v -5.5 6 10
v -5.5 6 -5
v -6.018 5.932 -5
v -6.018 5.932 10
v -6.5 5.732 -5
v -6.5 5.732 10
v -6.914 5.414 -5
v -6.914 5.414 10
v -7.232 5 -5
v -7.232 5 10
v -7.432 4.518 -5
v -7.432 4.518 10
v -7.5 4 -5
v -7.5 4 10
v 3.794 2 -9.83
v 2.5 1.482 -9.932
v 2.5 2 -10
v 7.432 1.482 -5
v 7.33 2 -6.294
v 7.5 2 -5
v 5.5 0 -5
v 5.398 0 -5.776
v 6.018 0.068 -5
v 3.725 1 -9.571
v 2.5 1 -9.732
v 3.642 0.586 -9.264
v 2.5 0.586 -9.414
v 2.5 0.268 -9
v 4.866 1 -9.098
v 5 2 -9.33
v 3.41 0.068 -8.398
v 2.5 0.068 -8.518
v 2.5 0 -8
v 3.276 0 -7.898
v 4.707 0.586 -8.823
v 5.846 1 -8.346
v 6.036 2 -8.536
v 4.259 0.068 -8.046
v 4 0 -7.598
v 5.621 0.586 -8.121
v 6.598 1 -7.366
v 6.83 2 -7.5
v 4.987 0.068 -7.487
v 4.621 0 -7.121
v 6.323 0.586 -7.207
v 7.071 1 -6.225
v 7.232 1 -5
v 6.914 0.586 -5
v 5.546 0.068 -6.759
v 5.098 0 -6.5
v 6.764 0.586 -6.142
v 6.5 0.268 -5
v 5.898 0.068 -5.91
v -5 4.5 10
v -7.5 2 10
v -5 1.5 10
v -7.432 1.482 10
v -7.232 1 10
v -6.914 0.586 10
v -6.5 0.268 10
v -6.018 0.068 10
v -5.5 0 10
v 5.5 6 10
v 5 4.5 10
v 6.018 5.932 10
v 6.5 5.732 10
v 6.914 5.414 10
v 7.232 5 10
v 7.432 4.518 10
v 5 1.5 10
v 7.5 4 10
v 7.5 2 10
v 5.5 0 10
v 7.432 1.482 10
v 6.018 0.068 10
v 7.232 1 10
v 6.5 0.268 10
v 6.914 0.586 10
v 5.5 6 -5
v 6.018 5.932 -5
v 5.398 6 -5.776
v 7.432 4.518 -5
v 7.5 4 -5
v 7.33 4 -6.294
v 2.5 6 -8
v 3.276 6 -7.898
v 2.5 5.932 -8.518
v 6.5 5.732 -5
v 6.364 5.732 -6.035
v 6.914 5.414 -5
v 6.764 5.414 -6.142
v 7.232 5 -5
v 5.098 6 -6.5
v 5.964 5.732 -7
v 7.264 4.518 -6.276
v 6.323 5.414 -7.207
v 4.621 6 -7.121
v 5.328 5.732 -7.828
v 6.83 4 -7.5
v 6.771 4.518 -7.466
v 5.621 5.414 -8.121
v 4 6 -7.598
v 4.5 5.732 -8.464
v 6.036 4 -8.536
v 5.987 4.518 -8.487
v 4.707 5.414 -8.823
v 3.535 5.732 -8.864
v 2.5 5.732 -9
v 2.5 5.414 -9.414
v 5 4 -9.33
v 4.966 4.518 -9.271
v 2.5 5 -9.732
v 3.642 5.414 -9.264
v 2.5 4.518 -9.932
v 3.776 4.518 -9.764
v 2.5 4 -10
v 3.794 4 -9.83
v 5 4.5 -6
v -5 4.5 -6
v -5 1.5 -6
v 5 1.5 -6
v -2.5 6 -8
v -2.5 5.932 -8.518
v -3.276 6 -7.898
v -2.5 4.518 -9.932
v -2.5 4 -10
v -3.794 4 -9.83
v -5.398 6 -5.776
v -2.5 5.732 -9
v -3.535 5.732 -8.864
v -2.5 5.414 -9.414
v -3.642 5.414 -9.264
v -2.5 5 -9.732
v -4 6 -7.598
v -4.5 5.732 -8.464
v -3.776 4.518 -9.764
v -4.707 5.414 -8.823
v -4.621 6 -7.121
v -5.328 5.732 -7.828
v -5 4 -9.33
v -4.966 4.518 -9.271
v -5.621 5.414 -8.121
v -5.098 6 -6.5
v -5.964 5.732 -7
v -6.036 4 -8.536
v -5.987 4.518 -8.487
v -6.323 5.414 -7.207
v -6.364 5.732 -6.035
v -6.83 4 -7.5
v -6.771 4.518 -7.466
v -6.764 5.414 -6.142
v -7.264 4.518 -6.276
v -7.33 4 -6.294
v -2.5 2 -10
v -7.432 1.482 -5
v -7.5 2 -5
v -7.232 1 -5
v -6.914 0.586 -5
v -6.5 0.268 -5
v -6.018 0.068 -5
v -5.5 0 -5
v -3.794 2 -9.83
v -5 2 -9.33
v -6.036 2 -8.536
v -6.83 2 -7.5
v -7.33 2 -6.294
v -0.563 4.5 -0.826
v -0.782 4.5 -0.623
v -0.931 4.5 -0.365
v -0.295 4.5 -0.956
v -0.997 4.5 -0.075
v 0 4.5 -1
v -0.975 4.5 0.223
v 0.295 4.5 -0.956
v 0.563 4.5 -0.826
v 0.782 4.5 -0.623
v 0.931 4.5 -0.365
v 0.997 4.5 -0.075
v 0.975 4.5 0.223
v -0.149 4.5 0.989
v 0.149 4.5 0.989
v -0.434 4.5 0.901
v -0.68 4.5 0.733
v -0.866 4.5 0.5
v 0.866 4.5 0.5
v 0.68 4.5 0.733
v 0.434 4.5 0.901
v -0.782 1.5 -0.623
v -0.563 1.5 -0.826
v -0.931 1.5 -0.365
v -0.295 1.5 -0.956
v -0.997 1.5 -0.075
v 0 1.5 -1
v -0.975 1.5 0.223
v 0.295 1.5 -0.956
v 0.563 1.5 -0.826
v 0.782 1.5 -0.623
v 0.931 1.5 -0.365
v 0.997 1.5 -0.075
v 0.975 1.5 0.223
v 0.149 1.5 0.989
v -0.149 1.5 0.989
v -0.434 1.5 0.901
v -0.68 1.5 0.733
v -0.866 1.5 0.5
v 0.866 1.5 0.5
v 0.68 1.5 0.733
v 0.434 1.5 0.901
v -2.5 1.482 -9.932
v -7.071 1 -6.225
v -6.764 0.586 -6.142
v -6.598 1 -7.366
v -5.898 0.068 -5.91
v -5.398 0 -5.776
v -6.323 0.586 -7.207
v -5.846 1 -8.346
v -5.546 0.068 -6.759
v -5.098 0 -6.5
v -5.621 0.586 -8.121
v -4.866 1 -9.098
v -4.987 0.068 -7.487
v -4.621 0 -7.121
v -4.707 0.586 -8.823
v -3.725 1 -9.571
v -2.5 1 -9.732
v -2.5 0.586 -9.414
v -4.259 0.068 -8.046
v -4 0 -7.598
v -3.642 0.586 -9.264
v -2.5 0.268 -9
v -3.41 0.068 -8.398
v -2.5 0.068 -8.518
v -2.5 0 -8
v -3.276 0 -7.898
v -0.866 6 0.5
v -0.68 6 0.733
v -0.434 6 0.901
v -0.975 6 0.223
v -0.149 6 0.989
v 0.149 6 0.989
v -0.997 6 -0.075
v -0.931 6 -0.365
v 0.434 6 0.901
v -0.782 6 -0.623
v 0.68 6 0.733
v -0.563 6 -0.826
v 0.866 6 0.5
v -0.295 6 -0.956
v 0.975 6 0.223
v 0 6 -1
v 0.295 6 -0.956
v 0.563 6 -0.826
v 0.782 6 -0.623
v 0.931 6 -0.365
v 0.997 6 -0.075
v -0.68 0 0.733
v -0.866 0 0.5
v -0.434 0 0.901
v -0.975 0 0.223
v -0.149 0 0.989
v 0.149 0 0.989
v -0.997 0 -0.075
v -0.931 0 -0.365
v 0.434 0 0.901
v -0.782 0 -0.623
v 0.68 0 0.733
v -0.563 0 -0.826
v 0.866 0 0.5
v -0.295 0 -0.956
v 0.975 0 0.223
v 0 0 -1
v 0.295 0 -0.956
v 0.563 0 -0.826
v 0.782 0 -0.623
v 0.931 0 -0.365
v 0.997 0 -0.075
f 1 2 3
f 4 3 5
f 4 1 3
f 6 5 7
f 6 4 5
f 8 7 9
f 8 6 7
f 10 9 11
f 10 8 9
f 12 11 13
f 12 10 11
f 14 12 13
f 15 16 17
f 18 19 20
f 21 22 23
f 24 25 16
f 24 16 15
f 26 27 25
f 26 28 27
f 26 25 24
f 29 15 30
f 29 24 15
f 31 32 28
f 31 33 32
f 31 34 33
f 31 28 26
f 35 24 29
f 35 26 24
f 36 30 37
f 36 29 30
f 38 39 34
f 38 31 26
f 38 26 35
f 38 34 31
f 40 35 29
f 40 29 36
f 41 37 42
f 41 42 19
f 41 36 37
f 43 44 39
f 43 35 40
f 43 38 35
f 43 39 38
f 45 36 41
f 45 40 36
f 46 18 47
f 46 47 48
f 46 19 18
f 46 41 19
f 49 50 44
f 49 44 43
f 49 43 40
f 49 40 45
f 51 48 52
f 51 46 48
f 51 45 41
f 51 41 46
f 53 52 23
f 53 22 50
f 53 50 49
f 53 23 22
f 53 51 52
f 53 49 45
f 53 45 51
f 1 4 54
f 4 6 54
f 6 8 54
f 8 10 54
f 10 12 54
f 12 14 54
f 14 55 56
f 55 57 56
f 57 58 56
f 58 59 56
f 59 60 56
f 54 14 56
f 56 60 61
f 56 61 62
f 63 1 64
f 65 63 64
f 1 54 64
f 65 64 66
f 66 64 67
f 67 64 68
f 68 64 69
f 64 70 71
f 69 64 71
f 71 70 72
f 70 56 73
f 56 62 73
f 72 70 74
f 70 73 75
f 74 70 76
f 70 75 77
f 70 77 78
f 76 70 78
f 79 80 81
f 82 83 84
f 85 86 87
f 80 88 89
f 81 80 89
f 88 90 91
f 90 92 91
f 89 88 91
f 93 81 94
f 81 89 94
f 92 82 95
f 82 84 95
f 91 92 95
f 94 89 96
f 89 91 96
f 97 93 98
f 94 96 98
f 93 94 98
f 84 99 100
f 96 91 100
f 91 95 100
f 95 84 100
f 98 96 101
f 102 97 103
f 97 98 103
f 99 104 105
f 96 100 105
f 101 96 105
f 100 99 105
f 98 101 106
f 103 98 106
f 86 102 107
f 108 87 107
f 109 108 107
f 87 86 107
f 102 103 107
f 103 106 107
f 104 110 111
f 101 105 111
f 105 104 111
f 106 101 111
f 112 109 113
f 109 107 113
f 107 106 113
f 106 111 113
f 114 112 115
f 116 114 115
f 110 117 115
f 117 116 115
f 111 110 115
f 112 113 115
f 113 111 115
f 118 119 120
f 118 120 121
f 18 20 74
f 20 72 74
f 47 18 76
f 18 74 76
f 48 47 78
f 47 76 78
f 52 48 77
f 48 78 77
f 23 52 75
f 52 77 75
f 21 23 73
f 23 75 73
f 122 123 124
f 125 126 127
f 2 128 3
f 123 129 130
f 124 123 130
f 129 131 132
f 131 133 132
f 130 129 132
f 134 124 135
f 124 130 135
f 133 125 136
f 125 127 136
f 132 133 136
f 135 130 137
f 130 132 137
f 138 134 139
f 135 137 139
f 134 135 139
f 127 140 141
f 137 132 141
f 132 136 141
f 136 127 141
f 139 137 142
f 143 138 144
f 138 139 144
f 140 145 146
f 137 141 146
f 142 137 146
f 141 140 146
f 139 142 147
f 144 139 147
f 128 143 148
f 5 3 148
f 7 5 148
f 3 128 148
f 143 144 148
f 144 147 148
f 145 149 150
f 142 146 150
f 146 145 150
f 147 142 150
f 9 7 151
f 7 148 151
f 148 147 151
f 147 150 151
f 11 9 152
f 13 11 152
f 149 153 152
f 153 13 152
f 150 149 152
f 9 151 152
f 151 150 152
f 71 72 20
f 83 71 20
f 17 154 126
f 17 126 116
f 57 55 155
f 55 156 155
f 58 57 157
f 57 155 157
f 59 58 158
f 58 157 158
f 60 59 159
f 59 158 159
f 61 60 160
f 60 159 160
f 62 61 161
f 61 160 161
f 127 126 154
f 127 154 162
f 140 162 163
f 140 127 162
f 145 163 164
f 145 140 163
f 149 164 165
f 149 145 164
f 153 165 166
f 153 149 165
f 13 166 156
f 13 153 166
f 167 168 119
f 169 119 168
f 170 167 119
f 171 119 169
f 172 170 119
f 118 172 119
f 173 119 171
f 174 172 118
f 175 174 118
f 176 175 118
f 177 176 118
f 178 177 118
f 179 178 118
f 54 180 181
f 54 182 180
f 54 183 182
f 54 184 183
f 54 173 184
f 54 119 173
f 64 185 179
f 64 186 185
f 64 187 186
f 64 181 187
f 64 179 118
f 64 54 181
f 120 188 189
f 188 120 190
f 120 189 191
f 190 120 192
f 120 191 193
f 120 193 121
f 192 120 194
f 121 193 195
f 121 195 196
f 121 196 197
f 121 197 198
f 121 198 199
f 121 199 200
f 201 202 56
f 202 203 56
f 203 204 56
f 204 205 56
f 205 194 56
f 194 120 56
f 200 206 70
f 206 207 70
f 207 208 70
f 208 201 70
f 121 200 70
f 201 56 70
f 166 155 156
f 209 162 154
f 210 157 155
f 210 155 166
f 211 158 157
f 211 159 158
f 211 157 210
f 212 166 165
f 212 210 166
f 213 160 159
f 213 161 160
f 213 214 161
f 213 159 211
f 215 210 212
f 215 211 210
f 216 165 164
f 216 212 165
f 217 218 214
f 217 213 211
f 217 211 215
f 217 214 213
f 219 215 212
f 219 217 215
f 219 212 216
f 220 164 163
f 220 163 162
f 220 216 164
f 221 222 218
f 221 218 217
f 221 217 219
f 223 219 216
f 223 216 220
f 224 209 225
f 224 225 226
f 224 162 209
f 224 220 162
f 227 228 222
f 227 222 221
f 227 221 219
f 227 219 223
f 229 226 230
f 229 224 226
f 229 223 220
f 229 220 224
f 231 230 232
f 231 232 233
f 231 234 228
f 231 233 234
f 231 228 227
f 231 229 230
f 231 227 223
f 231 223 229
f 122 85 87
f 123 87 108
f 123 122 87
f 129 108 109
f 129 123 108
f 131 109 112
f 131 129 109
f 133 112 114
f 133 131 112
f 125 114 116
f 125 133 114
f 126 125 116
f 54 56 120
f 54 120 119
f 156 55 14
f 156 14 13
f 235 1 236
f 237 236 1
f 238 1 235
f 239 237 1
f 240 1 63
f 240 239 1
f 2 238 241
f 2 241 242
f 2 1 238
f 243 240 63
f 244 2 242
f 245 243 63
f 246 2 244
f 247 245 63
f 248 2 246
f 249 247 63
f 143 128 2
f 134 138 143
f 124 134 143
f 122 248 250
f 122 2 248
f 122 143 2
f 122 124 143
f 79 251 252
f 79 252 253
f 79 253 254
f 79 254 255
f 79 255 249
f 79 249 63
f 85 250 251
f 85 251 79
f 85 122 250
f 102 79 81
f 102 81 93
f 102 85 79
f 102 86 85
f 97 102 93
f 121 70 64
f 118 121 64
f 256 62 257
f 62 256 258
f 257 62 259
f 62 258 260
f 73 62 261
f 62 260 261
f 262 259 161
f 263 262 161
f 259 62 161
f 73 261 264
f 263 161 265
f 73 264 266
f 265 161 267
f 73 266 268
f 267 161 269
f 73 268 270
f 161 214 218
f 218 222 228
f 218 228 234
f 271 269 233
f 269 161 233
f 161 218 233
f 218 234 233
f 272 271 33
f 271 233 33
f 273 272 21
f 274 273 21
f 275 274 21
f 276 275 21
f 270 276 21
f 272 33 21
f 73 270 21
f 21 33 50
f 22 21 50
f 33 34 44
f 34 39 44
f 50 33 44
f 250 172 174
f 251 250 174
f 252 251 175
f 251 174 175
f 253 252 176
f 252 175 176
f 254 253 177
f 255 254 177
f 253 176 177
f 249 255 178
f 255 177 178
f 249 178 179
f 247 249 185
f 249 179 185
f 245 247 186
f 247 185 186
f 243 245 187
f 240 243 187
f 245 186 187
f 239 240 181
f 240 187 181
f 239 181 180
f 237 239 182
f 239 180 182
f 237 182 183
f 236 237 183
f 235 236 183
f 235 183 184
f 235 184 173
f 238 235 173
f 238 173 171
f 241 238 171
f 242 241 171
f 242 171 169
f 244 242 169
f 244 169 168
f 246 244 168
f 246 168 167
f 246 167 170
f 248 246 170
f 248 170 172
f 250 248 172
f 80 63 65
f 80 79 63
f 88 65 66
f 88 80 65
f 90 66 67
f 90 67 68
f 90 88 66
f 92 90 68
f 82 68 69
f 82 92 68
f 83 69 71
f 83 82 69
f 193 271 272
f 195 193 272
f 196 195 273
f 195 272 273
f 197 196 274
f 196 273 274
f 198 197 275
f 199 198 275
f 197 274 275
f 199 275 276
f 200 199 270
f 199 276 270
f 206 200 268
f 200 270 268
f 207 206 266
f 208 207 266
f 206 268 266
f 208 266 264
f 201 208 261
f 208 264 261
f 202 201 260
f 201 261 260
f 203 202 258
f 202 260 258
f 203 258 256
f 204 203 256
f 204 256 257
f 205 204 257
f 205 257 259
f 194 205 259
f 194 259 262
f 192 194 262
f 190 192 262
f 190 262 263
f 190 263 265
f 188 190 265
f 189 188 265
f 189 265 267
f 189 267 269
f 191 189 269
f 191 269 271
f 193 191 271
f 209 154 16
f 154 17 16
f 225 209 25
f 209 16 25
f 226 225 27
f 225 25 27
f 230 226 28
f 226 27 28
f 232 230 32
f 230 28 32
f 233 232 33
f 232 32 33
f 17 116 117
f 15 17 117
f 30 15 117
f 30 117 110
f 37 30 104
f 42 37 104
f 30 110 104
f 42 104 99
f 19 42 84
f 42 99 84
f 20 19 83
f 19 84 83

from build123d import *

# Parameters (mm, degrees)
SKETCH1_W           = 15
SKETCH1_H           = 20
BOSS_EXTRUDE1_DEPTH = 6
SKETCH2_W           = 10
SKETCH2_H           = 3
CUT_EXTRUDE1_DEPTH  = 16
FILLET1_R           = 5
FILLET2_R           = 5
FILLET3_R           = 2
SKETCH3_R           = 1
CUT_EXTRUDE2_DEPTH  = 16


with BuildPart() as part:
    # Sketch1 → Boss-Extrude1 (new body)
    with BuildSketch(Plane(origin=(0, 0, 0), x_dir=(1, 0, 0), z_dir=(0, 1, 0))):
        Rectangle(SKETCH1_W, SKETCH1_H)
    extrude(amount=BOSS_EXTRUDE1_DEPTH)

    # Sketch2 → Cut-Extrude1 (cut)
    with BuildSketch(Plane.XY.offset(10)):
        with Locations((0, 3)):
            Rectangle(SKETCH2_W, SKETCH2_H)
    extrude(amount=-CUT_EXTRUDE1_DEPTH, mode=Mode.SUBTRACT)

    # Fillet1
    fillet1_edges = [part.edges().sort_by_distance(p)[0] for p in [
        (7.5, 3, -10),
    ]]
    fillet(fillet1_edges, radius=FILLET1_R)

    # Fillet2
    fillet2_edges = [part.edges().sort_by_distance(p)[0] for p in [
        (-7.5, 3, -10),
    ]]
    fillet(fillet2_edges, radius=FILLET2_R)

    # Fillet3
    fillet3_edges = [part.edges().sort_by_distance(p)[0] for p in [
        (7.5, 6, 2.5),
        (0, 0, -10),
        (0, 6, -10),
        (6.035533906, 0, -8.535533906),
        (6.035533906, 6, -8.535533906),
        (-7.5, 0, 2.5),
        (-7.5, 6, 2.5),
        (-6.035533906, 0, -8.535533906),
        (-6.035533906, 6, -8.535533906),
        (7.5, 0, 2.5),
    ]]
    fillet(fillet3_edges, radius=FILLET3_R)

    # Sketch3 → Cut-Extrude2 (cut)
    with BuildSketch(Plane.XZ):
        with Locations(Location((0, 0, 0), (0, 0, 270))):
            Circle(SKETCH3_R)
    extrude(amount=-CUT_EXTRUDE2_DEPTH, mode=Mode.SUBTRACT)


solid = part.part
